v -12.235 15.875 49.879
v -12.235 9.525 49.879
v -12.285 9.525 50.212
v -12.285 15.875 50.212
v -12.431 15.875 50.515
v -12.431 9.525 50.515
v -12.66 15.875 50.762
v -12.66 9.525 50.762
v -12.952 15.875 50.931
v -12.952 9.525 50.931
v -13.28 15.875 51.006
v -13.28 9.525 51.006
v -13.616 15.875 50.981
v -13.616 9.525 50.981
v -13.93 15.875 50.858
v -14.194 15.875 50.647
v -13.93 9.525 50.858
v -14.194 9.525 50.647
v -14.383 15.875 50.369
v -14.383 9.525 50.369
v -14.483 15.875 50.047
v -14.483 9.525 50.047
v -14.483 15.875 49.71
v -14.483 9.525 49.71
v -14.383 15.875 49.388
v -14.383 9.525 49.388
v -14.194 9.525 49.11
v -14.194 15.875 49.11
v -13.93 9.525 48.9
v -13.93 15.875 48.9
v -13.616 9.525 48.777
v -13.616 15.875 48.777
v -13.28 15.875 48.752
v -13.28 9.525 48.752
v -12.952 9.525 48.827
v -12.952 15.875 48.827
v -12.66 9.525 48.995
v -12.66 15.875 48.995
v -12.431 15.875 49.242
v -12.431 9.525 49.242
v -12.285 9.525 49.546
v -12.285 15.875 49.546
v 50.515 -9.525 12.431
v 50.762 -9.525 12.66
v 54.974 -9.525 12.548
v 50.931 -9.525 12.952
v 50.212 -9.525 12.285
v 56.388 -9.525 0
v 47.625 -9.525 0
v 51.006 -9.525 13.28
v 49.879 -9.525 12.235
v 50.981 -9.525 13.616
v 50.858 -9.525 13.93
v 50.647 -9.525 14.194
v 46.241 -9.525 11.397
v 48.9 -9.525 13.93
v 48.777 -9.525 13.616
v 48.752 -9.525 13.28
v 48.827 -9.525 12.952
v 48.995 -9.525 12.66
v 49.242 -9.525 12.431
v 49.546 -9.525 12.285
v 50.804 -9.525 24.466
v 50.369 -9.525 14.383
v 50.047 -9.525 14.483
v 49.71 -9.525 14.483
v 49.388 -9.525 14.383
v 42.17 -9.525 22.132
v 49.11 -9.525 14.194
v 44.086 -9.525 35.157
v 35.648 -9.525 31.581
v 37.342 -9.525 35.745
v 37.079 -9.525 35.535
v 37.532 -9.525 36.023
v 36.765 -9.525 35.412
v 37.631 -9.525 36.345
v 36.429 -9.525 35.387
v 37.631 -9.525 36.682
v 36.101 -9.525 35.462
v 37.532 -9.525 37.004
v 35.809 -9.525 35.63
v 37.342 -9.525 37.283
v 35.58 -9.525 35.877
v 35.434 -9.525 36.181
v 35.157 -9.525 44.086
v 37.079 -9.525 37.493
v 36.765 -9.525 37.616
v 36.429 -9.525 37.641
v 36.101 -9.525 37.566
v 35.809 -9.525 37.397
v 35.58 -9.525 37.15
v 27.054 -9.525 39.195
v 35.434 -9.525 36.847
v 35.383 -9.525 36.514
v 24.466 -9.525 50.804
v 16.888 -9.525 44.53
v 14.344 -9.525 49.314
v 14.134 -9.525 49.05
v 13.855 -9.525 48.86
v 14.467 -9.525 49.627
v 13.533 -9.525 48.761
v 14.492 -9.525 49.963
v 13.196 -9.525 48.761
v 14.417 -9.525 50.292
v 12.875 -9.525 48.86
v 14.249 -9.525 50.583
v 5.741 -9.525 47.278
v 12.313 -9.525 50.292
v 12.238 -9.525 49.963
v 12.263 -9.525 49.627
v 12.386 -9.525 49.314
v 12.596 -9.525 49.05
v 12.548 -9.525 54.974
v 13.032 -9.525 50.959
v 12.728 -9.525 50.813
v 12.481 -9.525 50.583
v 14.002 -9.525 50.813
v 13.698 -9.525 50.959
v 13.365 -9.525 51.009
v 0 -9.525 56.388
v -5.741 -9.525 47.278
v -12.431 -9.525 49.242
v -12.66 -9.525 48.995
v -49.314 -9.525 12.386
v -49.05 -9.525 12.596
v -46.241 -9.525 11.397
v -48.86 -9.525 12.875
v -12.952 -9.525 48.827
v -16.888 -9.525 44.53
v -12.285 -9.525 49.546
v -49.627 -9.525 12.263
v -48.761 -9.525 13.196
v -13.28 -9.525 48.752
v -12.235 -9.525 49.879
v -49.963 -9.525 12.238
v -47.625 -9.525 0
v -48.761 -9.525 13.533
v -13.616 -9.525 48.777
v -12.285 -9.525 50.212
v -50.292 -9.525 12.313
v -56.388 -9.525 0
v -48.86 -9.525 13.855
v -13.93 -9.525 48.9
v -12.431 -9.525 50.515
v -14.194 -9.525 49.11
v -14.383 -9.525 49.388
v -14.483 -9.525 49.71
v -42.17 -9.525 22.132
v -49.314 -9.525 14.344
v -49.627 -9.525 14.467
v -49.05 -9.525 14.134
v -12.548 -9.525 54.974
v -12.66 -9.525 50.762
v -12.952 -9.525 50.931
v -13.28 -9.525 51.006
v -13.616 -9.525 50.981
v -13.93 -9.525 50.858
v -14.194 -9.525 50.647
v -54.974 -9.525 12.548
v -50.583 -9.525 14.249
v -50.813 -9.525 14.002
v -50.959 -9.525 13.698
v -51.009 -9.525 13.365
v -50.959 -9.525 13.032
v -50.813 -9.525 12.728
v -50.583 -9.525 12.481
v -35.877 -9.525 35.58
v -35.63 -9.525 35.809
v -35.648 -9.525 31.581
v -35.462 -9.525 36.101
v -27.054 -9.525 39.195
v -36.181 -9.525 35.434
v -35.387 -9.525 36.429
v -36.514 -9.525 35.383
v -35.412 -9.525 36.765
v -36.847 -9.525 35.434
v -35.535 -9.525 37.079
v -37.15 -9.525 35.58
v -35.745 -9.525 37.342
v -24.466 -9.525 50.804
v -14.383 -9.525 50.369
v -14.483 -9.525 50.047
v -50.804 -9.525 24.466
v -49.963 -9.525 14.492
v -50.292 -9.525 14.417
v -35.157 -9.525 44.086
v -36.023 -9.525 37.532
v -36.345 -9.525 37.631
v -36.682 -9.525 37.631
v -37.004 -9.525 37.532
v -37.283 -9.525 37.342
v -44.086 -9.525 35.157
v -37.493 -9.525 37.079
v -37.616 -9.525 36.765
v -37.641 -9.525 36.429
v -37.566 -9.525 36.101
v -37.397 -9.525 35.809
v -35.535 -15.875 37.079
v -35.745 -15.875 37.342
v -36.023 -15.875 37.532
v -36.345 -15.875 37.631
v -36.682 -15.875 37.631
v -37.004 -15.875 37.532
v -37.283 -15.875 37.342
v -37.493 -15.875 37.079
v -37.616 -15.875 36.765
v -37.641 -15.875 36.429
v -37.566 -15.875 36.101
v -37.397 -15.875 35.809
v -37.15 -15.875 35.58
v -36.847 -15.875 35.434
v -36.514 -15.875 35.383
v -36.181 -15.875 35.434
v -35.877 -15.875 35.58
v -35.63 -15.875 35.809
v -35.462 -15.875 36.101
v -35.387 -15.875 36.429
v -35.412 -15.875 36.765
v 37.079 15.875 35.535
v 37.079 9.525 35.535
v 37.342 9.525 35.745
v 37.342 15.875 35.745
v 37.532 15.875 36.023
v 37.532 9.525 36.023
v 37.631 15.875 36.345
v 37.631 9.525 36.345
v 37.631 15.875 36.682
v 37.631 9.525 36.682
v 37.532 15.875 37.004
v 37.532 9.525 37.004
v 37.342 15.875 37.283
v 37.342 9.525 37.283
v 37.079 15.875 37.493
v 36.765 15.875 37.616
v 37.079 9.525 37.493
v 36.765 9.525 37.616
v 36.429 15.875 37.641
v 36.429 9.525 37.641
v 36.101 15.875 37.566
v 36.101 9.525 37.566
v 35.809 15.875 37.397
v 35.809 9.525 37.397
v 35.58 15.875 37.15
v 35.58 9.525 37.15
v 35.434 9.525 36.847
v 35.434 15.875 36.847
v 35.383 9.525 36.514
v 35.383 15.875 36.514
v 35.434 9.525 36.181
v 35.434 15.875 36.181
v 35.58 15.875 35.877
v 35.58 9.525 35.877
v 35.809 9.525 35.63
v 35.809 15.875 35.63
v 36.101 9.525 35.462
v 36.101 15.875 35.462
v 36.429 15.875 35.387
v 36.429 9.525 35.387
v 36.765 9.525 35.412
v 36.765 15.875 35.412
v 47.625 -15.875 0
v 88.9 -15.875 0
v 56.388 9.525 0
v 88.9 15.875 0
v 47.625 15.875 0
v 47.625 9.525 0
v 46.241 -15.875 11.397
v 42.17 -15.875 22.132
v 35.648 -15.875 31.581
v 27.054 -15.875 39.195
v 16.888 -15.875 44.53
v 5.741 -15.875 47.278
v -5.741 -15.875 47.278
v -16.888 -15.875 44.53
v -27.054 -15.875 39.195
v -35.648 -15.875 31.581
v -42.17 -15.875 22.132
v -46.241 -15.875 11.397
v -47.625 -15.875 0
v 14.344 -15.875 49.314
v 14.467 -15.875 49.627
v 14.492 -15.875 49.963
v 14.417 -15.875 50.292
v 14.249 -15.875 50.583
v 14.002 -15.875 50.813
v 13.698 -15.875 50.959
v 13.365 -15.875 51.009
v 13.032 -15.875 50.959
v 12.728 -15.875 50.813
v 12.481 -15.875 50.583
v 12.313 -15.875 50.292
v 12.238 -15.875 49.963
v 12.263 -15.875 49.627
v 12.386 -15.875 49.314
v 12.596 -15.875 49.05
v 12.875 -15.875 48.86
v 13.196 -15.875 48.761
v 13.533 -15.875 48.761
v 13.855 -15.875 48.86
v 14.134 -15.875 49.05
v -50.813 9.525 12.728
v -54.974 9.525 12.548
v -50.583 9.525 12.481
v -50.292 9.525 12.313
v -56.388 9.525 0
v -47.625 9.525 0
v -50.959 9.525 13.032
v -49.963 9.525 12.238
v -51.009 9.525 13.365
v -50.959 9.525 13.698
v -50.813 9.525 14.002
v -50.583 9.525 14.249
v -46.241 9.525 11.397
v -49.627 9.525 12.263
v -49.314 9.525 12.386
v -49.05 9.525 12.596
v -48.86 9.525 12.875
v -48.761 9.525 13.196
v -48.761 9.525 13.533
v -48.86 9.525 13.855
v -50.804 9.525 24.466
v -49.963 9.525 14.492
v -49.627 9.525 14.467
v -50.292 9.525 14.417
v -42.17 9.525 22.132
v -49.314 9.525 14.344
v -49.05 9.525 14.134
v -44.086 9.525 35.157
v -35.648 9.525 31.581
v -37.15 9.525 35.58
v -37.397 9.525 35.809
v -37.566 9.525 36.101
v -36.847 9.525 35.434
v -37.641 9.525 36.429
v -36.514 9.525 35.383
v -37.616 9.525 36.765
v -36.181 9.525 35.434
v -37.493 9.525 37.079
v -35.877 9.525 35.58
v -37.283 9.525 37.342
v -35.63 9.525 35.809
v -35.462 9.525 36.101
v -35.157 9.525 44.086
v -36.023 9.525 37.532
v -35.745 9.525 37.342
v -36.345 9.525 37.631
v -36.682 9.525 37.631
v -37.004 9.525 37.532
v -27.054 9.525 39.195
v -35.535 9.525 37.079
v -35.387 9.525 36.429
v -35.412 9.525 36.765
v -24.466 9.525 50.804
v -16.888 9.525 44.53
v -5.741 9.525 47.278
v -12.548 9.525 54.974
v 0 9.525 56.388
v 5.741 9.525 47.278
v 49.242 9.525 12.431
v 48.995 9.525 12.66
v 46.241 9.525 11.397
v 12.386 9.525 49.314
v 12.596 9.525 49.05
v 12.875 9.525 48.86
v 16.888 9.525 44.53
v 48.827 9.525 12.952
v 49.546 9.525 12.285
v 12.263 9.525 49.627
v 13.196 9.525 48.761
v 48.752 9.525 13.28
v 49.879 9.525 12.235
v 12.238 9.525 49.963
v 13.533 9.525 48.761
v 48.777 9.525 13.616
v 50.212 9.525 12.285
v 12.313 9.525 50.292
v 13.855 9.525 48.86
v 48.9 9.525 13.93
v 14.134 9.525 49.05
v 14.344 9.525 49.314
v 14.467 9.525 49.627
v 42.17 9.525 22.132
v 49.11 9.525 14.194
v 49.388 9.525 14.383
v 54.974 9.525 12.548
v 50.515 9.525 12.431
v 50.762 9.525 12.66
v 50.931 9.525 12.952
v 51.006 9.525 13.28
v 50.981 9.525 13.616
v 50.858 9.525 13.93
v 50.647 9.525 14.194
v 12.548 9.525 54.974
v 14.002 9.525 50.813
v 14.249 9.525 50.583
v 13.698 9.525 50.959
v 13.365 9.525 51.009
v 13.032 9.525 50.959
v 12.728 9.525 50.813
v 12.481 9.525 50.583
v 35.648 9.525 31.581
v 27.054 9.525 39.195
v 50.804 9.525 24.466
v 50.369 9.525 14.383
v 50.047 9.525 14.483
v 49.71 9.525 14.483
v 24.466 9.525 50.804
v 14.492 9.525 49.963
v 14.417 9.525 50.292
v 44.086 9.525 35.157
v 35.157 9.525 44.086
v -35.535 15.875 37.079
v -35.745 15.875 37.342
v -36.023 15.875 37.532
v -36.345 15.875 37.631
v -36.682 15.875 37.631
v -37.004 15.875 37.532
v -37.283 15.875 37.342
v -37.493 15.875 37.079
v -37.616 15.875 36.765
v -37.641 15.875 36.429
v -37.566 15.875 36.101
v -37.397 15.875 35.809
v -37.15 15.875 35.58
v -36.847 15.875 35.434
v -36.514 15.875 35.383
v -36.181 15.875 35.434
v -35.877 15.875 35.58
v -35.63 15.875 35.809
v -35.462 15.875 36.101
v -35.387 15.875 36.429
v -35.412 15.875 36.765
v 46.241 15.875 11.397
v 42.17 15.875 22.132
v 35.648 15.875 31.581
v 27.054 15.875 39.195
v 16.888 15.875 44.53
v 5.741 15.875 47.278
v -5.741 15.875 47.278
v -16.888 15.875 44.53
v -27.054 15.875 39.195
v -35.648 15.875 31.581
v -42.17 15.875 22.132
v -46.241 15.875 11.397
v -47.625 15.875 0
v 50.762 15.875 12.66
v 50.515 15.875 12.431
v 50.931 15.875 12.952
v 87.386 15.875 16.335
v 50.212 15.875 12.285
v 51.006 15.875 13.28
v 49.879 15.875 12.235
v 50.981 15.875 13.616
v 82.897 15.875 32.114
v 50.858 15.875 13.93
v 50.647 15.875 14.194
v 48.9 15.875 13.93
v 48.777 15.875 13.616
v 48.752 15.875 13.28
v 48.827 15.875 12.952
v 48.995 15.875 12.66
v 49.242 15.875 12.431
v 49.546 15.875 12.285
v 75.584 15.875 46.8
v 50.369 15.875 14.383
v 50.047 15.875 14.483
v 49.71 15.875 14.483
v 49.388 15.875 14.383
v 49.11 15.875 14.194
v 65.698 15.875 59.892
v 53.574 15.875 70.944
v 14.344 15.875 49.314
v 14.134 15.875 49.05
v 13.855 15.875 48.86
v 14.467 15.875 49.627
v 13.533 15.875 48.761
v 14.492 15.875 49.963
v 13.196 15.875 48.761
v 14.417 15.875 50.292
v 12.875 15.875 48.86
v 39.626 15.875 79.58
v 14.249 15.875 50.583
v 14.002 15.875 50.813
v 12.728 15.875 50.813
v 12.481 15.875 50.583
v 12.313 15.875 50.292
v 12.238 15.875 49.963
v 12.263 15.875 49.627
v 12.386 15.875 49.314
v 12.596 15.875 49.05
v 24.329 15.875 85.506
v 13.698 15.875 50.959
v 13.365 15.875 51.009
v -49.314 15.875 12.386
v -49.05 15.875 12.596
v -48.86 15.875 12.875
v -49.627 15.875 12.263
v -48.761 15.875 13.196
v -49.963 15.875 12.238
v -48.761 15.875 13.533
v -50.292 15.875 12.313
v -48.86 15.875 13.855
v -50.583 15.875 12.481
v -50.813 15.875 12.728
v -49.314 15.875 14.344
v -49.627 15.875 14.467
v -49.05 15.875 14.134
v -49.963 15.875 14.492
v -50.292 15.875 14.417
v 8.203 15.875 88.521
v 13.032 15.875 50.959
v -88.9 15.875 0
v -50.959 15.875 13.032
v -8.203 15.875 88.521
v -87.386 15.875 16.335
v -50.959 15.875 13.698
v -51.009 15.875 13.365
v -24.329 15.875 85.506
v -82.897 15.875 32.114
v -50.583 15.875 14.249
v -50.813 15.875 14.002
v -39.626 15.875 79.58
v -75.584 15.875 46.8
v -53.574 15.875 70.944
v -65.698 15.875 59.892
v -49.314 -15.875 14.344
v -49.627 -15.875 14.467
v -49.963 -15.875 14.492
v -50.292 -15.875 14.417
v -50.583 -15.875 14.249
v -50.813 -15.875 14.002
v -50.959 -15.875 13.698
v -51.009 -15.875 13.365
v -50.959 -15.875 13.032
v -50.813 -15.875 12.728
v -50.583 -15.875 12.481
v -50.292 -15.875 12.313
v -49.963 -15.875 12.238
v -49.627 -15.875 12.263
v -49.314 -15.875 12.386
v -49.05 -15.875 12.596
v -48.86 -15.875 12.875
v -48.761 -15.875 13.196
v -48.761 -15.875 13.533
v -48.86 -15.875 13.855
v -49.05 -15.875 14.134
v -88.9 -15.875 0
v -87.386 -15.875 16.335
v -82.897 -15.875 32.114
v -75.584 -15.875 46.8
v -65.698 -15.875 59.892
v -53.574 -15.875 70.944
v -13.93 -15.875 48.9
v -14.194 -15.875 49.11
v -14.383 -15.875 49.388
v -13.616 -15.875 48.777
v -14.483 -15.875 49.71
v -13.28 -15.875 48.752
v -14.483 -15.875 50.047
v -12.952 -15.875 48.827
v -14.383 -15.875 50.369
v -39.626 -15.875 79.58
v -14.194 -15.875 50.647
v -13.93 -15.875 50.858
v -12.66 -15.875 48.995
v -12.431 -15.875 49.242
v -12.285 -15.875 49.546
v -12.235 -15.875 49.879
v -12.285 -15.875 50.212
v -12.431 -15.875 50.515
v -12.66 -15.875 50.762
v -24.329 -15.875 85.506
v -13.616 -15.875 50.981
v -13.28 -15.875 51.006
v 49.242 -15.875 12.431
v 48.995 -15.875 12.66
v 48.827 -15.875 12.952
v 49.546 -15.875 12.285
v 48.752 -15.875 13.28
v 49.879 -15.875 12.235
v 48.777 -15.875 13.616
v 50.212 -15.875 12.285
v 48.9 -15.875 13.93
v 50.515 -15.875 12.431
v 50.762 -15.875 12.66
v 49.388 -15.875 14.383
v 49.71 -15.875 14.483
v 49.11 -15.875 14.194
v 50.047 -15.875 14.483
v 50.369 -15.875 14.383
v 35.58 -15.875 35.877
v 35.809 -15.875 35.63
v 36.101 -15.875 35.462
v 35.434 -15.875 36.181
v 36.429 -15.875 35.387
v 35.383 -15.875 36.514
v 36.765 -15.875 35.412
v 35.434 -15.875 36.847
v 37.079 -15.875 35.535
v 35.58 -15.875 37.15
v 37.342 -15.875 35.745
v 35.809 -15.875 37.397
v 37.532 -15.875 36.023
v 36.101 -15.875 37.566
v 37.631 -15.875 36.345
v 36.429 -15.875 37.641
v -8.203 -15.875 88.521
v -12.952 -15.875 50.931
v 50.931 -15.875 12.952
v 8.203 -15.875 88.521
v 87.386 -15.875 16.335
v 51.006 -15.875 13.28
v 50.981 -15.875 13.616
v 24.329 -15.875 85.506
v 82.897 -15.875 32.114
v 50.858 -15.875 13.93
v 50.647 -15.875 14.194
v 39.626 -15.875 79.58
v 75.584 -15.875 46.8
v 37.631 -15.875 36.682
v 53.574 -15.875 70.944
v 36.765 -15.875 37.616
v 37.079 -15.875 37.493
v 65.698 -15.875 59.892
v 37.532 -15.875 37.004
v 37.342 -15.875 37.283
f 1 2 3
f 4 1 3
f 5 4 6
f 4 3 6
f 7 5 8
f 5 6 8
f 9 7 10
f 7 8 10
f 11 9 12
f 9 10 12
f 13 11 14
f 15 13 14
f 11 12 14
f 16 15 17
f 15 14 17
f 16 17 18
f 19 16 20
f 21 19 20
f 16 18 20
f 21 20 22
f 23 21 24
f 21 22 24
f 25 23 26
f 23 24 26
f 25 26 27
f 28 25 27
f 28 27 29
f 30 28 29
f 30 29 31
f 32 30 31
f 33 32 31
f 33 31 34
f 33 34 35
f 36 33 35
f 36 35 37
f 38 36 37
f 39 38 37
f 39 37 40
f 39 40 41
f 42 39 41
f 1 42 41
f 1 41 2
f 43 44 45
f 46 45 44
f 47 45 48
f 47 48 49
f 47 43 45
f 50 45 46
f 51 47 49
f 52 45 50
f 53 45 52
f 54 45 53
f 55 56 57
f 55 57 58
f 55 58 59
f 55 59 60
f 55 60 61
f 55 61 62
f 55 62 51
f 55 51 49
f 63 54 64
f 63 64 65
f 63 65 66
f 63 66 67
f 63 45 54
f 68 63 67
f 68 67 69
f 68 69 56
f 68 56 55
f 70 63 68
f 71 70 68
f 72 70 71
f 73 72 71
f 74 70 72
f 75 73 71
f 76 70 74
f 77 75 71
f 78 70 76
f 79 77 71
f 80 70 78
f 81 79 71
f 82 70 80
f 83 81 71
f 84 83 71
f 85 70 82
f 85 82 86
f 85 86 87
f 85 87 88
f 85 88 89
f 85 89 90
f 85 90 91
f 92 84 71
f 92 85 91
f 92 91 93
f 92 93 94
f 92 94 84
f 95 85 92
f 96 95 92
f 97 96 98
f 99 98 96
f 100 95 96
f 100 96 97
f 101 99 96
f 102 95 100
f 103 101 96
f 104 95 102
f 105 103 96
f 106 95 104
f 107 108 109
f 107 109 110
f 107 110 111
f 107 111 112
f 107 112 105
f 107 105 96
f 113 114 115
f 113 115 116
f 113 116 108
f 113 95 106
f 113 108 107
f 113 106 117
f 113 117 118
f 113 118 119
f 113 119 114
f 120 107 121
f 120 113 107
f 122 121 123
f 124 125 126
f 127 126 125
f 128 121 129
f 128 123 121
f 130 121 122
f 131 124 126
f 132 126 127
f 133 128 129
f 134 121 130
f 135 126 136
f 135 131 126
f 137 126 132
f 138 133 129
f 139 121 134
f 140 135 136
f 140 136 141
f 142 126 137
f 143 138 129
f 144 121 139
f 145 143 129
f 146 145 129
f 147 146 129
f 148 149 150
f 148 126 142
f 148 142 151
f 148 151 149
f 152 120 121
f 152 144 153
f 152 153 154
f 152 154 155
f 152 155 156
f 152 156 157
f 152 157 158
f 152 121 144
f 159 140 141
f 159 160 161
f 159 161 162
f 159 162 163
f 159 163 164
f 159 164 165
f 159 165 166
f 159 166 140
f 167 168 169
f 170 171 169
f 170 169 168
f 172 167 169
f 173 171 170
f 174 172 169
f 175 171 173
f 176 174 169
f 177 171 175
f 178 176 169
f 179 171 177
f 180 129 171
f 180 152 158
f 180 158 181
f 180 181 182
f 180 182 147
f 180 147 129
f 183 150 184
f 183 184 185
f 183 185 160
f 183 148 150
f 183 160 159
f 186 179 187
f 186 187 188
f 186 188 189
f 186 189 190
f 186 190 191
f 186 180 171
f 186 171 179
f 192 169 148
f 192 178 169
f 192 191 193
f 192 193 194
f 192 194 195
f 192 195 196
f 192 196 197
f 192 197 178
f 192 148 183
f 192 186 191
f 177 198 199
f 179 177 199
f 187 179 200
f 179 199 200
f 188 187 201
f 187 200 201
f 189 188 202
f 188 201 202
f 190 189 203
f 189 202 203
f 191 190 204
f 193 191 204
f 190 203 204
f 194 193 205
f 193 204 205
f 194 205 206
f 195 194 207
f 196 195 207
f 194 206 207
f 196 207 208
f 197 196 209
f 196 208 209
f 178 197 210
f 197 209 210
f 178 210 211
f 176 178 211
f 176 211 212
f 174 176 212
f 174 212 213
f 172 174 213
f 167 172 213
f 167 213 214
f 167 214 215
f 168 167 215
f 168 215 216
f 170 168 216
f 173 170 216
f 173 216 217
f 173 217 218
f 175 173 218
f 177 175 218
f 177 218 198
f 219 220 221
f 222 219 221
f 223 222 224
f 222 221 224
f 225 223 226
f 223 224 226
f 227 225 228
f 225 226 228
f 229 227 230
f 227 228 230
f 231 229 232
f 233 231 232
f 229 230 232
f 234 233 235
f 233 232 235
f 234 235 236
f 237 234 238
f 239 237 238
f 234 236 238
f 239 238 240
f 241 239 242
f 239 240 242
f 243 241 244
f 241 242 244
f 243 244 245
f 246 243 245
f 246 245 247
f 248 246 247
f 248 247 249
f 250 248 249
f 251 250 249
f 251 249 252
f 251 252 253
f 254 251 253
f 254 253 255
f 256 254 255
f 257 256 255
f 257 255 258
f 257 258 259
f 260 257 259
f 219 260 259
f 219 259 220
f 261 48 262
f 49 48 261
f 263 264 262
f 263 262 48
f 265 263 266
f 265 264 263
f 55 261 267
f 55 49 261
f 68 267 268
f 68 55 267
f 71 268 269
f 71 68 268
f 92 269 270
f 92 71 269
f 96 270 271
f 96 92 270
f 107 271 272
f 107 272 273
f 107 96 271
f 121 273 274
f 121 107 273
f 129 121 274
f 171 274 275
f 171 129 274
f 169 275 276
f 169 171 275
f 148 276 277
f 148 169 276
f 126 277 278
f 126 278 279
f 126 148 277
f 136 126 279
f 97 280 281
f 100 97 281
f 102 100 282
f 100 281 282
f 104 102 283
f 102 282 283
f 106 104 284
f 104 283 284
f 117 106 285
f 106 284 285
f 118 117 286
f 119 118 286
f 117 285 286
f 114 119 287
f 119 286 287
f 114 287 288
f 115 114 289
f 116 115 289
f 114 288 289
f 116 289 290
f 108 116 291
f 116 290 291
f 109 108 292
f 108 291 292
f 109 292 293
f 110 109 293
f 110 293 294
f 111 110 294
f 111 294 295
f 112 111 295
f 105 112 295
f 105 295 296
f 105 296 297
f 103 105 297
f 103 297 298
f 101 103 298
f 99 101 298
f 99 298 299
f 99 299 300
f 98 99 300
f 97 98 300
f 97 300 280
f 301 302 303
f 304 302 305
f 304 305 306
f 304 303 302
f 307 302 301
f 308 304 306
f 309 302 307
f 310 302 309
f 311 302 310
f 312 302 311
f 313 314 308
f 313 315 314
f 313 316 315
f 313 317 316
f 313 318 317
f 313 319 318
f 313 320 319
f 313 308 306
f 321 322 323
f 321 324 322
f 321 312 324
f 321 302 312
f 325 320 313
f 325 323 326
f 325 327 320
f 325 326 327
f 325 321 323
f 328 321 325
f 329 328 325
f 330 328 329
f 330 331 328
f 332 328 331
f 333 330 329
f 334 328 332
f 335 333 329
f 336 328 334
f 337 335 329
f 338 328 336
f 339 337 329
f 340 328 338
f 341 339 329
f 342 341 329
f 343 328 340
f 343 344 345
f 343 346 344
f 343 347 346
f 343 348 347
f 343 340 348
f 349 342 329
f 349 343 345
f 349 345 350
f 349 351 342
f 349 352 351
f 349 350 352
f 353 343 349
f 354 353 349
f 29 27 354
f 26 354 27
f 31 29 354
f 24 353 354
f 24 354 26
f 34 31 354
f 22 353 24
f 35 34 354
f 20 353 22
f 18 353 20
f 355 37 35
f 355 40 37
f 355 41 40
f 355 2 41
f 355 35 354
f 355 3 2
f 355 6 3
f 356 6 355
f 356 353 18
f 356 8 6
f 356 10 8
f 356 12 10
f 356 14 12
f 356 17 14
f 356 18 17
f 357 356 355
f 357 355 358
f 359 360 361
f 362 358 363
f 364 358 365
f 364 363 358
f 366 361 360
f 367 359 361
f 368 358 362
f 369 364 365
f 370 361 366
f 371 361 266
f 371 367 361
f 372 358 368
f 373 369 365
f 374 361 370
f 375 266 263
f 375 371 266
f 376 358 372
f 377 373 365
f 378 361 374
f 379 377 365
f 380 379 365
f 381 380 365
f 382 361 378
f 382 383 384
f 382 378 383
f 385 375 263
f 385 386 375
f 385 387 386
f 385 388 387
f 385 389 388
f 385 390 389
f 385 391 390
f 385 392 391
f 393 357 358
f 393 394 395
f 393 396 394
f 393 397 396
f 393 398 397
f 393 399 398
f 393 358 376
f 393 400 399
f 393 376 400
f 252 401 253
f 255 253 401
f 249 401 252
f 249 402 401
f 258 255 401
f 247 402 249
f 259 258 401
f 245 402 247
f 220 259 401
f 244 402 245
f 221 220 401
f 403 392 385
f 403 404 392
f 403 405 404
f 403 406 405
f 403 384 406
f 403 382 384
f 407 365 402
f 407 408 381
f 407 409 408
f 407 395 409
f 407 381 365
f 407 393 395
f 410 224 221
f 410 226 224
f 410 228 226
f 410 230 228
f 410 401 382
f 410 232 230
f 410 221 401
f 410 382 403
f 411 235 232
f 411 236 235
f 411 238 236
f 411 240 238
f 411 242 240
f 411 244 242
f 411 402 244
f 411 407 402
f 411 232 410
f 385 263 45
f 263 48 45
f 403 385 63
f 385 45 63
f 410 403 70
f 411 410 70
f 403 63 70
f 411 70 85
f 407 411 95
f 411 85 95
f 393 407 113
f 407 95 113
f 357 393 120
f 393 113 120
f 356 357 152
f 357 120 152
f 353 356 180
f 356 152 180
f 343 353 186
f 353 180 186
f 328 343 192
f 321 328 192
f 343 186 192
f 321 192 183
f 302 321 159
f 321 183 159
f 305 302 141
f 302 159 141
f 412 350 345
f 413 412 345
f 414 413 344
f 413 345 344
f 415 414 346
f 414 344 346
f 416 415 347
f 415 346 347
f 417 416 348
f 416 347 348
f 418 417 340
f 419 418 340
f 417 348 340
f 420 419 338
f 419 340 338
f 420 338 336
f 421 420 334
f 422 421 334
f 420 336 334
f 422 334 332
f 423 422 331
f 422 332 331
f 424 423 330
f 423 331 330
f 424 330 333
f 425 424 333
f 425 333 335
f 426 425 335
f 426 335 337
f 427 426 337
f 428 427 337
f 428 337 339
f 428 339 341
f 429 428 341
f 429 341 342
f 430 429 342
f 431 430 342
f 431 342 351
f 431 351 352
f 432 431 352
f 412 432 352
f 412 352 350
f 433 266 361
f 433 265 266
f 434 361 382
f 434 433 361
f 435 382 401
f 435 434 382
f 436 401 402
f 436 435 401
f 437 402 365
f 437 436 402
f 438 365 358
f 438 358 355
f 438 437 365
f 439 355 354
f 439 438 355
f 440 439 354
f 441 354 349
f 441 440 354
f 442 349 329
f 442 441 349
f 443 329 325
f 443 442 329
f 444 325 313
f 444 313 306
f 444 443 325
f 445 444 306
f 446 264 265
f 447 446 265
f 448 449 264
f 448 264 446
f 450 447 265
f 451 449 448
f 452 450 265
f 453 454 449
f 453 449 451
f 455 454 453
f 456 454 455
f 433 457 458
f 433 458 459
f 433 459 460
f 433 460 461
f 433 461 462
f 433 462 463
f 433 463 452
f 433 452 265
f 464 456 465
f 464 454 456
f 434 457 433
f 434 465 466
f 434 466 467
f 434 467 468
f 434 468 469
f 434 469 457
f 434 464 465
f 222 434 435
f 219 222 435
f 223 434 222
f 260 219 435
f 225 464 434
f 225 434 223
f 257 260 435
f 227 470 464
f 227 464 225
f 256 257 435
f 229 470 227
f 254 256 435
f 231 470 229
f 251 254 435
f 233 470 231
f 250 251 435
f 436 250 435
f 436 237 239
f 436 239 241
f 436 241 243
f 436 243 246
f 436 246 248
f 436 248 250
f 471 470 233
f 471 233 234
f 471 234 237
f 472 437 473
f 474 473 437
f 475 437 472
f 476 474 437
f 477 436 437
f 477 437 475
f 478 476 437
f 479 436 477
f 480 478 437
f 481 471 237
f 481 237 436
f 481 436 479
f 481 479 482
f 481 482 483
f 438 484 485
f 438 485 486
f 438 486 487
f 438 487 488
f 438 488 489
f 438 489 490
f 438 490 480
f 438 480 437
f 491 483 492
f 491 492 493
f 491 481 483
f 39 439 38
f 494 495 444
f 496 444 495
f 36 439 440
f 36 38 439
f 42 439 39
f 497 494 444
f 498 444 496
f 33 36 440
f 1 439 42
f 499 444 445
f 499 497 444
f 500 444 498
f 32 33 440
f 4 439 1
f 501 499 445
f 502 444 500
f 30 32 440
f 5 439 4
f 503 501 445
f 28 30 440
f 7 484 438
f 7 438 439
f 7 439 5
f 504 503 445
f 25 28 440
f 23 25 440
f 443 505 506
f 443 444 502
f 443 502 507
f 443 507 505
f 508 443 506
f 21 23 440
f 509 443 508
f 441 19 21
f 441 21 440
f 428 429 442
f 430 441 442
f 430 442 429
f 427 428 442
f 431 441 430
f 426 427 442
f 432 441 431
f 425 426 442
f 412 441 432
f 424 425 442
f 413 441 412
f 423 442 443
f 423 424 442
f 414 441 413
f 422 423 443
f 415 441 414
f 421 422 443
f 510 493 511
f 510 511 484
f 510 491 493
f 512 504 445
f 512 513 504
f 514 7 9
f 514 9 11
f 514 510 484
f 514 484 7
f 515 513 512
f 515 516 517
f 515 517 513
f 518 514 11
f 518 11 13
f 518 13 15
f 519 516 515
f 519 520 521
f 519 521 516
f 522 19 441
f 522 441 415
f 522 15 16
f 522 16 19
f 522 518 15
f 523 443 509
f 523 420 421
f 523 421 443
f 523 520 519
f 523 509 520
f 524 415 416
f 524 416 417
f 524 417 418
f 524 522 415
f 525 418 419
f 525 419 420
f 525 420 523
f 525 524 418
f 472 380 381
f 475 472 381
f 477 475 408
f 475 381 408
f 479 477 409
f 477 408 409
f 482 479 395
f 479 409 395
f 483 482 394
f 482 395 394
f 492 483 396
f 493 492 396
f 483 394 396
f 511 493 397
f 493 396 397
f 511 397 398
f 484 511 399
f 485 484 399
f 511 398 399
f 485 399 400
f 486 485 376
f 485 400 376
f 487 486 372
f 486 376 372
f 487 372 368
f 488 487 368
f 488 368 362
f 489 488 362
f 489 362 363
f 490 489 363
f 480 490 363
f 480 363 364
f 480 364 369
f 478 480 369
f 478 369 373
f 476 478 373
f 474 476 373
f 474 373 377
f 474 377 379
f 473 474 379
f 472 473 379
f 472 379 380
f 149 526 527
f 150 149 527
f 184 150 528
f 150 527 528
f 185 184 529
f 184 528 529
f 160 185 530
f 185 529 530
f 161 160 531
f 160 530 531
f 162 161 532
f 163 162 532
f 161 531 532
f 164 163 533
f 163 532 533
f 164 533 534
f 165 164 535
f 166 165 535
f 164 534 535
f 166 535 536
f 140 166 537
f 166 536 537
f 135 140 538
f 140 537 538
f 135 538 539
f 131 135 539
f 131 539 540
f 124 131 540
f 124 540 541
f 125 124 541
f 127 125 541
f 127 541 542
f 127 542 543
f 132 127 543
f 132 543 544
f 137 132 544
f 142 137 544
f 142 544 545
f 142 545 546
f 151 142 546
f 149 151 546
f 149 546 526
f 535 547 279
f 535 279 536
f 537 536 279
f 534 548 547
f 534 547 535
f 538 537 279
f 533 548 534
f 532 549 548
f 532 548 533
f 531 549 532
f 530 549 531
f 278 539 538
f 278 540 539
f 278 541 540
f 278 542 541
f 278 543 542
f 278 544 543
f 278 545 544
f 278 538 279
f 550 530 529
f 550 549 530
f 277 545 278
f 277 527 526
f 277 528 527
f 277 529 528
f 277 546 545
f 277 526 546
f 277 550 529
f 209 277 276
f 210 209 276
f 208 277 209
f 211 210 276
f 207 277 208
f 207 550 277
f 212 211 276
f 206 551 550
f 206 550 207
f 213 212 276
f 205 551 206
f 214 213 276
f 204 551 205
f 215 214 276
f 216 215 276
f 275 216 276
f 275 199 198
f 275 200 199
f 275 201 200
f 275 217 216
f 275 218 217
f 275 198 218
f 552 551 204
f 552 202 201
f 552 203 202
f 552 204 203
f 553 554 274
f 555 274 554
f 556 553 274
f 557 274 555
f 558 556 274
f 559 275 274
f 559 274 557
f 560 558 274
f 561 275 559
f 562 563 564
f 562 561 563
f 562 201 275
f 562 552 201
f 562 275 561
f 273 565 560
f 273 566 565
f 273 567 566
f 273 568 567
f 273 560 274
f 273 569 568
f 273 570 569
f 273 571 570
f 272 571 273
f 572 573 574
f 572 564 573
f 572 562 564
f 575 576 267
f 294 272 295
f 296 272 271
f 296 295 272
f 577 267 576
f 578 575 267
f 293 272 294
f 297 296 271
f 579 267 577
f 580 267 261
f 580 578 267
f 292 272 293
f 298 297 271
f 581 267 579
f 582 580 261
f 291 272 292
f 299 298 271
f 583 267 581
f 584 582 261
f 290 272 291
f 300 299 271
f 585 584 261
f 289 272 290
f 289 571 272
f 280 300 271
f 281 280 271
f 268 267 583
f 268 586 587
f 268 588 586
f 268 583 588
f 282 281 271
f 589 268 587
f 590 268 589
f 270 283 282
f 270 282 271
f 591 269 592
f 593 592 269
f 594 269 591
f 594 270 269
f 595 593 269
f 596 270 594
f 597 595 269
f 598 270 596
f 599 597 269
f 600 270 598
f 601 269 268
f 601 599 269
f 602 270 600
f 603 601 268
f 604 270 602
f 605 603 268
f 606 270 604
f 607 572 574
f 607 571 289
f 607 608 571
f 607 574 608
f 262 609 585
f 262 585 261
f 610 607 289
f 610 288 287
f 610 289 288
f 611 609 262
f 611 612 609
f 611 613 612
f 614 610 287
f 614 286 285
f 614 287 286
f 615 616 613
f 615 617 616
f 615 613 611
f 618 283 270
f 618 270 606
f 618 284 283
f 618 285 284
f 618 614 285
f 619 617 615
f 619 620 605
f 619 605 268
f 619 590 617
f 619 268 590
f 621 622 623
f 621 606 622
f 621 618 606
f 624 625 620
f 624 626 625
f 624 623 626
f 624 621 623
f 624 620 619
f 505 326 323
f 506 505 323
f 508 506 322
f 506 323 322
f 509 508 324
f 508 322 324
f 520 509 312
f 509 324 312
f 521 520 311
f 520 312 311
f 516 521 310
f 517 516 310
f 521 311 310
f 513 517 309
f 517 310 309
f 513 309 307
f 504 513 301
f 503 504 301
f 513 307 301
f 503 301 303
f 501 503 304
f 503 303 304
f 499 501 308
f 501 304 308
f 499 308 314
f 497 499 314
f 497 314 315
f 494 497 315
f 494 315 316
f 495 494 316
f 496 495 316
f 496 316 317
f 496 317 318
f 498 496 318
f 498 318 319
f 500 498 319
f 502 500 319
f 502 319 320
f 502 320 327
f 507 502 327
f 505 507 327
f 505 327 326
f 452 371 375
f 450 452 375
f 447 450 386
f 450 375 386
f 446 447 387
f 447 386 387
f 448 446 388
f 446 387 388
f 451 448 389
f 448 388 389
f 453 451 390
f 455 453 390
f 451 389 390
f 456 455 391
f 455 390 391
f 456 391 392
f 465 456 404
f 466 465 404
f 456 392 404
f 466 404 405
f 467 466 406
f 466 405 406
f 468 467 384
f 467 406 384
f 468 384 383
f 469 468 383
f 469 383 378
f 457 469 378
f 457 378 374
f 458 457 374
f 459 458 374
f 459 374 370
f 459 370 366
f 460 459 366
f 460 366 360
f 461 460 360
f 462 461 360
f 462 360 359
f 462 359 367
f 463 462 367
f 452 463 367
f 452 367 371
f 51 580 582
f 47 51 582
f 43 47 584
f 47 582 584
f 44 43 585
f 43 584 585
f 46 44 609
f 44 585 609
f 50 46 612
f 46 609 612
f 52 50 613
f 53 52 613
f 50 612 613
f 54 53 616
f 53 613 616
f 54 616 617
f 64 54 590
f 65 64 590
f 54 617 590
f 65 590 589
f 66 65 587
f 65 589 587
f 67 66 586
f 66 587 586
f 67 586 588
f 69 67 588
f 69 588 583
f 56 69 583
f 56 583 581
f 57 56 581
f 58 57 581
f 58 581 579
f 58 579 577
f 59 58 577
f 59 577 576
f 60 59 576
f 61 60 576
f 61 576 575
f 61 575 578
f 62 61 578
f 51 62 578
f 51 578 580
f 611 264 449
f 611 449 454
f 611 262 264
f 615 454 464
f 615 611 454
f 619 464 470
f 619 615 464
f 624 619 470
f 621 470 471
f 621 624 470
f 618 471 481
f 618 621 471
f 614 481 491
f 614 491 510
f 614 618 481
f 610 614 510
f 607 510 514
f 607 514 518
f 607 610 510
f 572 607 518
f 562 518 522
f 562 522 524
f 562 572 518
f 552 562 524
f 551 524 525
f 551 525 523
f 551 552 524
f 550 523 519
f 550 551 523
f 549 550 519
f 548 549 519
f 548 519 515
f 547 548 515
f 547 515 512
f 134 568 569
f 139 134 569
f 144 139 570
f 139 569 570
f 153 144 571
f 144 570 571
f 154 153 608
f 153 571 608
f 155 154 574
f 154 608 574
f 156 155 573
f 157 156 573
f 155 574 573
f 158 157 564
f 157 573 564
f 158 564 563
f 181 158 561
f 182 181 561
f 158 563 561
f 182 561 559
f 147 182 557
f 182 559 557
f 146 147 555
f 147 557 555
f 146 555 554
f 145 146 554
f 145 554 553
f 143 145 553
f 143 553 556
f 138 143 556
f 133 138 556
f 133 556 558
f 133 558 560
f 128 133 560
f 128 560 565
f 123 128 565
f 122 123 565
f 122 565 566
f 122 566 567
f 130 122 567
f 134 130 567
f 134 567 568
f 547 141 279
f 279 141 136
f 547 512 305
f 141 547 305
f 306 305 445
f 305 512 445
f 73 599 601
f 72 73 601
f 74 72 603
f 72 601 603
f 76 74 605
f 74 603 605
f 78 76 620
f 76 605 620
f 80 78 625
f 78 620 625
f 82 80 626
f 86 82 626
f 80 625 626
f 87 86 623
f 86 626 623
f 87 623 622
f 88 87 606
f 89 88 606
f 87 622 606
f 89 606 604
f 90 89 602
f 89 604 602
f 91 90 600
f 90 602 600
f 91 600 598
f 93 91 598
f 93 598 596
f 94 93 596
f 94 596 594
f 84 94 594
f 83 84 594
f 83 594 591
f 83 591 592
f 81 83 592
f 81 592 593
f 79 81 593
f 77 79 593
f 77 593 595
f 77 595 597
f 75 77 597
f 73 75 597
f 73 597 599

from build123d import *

# Parameters (mm, degrees)
REVOLVE1_ANGLE            = 180
TAP_DRILL_FOR_4_40_TAP1_D = 2.2606
CIRPATTERN1_COUNT         = 12


with BuildPart() as part:
    # Sketch1 → Revolve1 (revolve)
    with BuildSketch(Plane.XY):
        Polygon((56.388, 0), (56.388, 9.525), (47.625, 9.525), (47.625, 15.875), (88.9, 15.875), (88.9, -15.875), (47.625, -15.875), (47.625, -9.525), (56.388, -9.525), align=None)
    revolve(axis=Axis((0, 22.539286723, 0), (0, -1, 0)), revolution_arc=REVOLVE1_ANGLE)

    # Tap Drill for #4-40 Tap1 (through all)
    with Locations(Plane(origin=(49.878671003, 15.875, 13.364949615), x_dir=(0, 0, 1), z_dir=(0, 1, 0))):
        with Locations((0, 0)):
            tap_drill_for_4_40_tap1 = Hole(TAP_DRILL_FOR_4_40_TAP1_D / 2)

    # CirPattern1: Tap Drill for #4-40 Tap1 ×12 about axis, 6 skipped
    cirpattern1_axis = Axis((0, 15.875, 0), (0, 1, 0))
    add([tap_drill_for_4_40_tap1.rotate(cirpattern1_axis, i * 360 / CIRPATTERN1_COUNT) for i in range(1, CIRPATTERN1_COUNT) if i not in (1, 2, 3, 4, 5, 6)], mode=Mode.SUBTRACT)


solid = part.part
